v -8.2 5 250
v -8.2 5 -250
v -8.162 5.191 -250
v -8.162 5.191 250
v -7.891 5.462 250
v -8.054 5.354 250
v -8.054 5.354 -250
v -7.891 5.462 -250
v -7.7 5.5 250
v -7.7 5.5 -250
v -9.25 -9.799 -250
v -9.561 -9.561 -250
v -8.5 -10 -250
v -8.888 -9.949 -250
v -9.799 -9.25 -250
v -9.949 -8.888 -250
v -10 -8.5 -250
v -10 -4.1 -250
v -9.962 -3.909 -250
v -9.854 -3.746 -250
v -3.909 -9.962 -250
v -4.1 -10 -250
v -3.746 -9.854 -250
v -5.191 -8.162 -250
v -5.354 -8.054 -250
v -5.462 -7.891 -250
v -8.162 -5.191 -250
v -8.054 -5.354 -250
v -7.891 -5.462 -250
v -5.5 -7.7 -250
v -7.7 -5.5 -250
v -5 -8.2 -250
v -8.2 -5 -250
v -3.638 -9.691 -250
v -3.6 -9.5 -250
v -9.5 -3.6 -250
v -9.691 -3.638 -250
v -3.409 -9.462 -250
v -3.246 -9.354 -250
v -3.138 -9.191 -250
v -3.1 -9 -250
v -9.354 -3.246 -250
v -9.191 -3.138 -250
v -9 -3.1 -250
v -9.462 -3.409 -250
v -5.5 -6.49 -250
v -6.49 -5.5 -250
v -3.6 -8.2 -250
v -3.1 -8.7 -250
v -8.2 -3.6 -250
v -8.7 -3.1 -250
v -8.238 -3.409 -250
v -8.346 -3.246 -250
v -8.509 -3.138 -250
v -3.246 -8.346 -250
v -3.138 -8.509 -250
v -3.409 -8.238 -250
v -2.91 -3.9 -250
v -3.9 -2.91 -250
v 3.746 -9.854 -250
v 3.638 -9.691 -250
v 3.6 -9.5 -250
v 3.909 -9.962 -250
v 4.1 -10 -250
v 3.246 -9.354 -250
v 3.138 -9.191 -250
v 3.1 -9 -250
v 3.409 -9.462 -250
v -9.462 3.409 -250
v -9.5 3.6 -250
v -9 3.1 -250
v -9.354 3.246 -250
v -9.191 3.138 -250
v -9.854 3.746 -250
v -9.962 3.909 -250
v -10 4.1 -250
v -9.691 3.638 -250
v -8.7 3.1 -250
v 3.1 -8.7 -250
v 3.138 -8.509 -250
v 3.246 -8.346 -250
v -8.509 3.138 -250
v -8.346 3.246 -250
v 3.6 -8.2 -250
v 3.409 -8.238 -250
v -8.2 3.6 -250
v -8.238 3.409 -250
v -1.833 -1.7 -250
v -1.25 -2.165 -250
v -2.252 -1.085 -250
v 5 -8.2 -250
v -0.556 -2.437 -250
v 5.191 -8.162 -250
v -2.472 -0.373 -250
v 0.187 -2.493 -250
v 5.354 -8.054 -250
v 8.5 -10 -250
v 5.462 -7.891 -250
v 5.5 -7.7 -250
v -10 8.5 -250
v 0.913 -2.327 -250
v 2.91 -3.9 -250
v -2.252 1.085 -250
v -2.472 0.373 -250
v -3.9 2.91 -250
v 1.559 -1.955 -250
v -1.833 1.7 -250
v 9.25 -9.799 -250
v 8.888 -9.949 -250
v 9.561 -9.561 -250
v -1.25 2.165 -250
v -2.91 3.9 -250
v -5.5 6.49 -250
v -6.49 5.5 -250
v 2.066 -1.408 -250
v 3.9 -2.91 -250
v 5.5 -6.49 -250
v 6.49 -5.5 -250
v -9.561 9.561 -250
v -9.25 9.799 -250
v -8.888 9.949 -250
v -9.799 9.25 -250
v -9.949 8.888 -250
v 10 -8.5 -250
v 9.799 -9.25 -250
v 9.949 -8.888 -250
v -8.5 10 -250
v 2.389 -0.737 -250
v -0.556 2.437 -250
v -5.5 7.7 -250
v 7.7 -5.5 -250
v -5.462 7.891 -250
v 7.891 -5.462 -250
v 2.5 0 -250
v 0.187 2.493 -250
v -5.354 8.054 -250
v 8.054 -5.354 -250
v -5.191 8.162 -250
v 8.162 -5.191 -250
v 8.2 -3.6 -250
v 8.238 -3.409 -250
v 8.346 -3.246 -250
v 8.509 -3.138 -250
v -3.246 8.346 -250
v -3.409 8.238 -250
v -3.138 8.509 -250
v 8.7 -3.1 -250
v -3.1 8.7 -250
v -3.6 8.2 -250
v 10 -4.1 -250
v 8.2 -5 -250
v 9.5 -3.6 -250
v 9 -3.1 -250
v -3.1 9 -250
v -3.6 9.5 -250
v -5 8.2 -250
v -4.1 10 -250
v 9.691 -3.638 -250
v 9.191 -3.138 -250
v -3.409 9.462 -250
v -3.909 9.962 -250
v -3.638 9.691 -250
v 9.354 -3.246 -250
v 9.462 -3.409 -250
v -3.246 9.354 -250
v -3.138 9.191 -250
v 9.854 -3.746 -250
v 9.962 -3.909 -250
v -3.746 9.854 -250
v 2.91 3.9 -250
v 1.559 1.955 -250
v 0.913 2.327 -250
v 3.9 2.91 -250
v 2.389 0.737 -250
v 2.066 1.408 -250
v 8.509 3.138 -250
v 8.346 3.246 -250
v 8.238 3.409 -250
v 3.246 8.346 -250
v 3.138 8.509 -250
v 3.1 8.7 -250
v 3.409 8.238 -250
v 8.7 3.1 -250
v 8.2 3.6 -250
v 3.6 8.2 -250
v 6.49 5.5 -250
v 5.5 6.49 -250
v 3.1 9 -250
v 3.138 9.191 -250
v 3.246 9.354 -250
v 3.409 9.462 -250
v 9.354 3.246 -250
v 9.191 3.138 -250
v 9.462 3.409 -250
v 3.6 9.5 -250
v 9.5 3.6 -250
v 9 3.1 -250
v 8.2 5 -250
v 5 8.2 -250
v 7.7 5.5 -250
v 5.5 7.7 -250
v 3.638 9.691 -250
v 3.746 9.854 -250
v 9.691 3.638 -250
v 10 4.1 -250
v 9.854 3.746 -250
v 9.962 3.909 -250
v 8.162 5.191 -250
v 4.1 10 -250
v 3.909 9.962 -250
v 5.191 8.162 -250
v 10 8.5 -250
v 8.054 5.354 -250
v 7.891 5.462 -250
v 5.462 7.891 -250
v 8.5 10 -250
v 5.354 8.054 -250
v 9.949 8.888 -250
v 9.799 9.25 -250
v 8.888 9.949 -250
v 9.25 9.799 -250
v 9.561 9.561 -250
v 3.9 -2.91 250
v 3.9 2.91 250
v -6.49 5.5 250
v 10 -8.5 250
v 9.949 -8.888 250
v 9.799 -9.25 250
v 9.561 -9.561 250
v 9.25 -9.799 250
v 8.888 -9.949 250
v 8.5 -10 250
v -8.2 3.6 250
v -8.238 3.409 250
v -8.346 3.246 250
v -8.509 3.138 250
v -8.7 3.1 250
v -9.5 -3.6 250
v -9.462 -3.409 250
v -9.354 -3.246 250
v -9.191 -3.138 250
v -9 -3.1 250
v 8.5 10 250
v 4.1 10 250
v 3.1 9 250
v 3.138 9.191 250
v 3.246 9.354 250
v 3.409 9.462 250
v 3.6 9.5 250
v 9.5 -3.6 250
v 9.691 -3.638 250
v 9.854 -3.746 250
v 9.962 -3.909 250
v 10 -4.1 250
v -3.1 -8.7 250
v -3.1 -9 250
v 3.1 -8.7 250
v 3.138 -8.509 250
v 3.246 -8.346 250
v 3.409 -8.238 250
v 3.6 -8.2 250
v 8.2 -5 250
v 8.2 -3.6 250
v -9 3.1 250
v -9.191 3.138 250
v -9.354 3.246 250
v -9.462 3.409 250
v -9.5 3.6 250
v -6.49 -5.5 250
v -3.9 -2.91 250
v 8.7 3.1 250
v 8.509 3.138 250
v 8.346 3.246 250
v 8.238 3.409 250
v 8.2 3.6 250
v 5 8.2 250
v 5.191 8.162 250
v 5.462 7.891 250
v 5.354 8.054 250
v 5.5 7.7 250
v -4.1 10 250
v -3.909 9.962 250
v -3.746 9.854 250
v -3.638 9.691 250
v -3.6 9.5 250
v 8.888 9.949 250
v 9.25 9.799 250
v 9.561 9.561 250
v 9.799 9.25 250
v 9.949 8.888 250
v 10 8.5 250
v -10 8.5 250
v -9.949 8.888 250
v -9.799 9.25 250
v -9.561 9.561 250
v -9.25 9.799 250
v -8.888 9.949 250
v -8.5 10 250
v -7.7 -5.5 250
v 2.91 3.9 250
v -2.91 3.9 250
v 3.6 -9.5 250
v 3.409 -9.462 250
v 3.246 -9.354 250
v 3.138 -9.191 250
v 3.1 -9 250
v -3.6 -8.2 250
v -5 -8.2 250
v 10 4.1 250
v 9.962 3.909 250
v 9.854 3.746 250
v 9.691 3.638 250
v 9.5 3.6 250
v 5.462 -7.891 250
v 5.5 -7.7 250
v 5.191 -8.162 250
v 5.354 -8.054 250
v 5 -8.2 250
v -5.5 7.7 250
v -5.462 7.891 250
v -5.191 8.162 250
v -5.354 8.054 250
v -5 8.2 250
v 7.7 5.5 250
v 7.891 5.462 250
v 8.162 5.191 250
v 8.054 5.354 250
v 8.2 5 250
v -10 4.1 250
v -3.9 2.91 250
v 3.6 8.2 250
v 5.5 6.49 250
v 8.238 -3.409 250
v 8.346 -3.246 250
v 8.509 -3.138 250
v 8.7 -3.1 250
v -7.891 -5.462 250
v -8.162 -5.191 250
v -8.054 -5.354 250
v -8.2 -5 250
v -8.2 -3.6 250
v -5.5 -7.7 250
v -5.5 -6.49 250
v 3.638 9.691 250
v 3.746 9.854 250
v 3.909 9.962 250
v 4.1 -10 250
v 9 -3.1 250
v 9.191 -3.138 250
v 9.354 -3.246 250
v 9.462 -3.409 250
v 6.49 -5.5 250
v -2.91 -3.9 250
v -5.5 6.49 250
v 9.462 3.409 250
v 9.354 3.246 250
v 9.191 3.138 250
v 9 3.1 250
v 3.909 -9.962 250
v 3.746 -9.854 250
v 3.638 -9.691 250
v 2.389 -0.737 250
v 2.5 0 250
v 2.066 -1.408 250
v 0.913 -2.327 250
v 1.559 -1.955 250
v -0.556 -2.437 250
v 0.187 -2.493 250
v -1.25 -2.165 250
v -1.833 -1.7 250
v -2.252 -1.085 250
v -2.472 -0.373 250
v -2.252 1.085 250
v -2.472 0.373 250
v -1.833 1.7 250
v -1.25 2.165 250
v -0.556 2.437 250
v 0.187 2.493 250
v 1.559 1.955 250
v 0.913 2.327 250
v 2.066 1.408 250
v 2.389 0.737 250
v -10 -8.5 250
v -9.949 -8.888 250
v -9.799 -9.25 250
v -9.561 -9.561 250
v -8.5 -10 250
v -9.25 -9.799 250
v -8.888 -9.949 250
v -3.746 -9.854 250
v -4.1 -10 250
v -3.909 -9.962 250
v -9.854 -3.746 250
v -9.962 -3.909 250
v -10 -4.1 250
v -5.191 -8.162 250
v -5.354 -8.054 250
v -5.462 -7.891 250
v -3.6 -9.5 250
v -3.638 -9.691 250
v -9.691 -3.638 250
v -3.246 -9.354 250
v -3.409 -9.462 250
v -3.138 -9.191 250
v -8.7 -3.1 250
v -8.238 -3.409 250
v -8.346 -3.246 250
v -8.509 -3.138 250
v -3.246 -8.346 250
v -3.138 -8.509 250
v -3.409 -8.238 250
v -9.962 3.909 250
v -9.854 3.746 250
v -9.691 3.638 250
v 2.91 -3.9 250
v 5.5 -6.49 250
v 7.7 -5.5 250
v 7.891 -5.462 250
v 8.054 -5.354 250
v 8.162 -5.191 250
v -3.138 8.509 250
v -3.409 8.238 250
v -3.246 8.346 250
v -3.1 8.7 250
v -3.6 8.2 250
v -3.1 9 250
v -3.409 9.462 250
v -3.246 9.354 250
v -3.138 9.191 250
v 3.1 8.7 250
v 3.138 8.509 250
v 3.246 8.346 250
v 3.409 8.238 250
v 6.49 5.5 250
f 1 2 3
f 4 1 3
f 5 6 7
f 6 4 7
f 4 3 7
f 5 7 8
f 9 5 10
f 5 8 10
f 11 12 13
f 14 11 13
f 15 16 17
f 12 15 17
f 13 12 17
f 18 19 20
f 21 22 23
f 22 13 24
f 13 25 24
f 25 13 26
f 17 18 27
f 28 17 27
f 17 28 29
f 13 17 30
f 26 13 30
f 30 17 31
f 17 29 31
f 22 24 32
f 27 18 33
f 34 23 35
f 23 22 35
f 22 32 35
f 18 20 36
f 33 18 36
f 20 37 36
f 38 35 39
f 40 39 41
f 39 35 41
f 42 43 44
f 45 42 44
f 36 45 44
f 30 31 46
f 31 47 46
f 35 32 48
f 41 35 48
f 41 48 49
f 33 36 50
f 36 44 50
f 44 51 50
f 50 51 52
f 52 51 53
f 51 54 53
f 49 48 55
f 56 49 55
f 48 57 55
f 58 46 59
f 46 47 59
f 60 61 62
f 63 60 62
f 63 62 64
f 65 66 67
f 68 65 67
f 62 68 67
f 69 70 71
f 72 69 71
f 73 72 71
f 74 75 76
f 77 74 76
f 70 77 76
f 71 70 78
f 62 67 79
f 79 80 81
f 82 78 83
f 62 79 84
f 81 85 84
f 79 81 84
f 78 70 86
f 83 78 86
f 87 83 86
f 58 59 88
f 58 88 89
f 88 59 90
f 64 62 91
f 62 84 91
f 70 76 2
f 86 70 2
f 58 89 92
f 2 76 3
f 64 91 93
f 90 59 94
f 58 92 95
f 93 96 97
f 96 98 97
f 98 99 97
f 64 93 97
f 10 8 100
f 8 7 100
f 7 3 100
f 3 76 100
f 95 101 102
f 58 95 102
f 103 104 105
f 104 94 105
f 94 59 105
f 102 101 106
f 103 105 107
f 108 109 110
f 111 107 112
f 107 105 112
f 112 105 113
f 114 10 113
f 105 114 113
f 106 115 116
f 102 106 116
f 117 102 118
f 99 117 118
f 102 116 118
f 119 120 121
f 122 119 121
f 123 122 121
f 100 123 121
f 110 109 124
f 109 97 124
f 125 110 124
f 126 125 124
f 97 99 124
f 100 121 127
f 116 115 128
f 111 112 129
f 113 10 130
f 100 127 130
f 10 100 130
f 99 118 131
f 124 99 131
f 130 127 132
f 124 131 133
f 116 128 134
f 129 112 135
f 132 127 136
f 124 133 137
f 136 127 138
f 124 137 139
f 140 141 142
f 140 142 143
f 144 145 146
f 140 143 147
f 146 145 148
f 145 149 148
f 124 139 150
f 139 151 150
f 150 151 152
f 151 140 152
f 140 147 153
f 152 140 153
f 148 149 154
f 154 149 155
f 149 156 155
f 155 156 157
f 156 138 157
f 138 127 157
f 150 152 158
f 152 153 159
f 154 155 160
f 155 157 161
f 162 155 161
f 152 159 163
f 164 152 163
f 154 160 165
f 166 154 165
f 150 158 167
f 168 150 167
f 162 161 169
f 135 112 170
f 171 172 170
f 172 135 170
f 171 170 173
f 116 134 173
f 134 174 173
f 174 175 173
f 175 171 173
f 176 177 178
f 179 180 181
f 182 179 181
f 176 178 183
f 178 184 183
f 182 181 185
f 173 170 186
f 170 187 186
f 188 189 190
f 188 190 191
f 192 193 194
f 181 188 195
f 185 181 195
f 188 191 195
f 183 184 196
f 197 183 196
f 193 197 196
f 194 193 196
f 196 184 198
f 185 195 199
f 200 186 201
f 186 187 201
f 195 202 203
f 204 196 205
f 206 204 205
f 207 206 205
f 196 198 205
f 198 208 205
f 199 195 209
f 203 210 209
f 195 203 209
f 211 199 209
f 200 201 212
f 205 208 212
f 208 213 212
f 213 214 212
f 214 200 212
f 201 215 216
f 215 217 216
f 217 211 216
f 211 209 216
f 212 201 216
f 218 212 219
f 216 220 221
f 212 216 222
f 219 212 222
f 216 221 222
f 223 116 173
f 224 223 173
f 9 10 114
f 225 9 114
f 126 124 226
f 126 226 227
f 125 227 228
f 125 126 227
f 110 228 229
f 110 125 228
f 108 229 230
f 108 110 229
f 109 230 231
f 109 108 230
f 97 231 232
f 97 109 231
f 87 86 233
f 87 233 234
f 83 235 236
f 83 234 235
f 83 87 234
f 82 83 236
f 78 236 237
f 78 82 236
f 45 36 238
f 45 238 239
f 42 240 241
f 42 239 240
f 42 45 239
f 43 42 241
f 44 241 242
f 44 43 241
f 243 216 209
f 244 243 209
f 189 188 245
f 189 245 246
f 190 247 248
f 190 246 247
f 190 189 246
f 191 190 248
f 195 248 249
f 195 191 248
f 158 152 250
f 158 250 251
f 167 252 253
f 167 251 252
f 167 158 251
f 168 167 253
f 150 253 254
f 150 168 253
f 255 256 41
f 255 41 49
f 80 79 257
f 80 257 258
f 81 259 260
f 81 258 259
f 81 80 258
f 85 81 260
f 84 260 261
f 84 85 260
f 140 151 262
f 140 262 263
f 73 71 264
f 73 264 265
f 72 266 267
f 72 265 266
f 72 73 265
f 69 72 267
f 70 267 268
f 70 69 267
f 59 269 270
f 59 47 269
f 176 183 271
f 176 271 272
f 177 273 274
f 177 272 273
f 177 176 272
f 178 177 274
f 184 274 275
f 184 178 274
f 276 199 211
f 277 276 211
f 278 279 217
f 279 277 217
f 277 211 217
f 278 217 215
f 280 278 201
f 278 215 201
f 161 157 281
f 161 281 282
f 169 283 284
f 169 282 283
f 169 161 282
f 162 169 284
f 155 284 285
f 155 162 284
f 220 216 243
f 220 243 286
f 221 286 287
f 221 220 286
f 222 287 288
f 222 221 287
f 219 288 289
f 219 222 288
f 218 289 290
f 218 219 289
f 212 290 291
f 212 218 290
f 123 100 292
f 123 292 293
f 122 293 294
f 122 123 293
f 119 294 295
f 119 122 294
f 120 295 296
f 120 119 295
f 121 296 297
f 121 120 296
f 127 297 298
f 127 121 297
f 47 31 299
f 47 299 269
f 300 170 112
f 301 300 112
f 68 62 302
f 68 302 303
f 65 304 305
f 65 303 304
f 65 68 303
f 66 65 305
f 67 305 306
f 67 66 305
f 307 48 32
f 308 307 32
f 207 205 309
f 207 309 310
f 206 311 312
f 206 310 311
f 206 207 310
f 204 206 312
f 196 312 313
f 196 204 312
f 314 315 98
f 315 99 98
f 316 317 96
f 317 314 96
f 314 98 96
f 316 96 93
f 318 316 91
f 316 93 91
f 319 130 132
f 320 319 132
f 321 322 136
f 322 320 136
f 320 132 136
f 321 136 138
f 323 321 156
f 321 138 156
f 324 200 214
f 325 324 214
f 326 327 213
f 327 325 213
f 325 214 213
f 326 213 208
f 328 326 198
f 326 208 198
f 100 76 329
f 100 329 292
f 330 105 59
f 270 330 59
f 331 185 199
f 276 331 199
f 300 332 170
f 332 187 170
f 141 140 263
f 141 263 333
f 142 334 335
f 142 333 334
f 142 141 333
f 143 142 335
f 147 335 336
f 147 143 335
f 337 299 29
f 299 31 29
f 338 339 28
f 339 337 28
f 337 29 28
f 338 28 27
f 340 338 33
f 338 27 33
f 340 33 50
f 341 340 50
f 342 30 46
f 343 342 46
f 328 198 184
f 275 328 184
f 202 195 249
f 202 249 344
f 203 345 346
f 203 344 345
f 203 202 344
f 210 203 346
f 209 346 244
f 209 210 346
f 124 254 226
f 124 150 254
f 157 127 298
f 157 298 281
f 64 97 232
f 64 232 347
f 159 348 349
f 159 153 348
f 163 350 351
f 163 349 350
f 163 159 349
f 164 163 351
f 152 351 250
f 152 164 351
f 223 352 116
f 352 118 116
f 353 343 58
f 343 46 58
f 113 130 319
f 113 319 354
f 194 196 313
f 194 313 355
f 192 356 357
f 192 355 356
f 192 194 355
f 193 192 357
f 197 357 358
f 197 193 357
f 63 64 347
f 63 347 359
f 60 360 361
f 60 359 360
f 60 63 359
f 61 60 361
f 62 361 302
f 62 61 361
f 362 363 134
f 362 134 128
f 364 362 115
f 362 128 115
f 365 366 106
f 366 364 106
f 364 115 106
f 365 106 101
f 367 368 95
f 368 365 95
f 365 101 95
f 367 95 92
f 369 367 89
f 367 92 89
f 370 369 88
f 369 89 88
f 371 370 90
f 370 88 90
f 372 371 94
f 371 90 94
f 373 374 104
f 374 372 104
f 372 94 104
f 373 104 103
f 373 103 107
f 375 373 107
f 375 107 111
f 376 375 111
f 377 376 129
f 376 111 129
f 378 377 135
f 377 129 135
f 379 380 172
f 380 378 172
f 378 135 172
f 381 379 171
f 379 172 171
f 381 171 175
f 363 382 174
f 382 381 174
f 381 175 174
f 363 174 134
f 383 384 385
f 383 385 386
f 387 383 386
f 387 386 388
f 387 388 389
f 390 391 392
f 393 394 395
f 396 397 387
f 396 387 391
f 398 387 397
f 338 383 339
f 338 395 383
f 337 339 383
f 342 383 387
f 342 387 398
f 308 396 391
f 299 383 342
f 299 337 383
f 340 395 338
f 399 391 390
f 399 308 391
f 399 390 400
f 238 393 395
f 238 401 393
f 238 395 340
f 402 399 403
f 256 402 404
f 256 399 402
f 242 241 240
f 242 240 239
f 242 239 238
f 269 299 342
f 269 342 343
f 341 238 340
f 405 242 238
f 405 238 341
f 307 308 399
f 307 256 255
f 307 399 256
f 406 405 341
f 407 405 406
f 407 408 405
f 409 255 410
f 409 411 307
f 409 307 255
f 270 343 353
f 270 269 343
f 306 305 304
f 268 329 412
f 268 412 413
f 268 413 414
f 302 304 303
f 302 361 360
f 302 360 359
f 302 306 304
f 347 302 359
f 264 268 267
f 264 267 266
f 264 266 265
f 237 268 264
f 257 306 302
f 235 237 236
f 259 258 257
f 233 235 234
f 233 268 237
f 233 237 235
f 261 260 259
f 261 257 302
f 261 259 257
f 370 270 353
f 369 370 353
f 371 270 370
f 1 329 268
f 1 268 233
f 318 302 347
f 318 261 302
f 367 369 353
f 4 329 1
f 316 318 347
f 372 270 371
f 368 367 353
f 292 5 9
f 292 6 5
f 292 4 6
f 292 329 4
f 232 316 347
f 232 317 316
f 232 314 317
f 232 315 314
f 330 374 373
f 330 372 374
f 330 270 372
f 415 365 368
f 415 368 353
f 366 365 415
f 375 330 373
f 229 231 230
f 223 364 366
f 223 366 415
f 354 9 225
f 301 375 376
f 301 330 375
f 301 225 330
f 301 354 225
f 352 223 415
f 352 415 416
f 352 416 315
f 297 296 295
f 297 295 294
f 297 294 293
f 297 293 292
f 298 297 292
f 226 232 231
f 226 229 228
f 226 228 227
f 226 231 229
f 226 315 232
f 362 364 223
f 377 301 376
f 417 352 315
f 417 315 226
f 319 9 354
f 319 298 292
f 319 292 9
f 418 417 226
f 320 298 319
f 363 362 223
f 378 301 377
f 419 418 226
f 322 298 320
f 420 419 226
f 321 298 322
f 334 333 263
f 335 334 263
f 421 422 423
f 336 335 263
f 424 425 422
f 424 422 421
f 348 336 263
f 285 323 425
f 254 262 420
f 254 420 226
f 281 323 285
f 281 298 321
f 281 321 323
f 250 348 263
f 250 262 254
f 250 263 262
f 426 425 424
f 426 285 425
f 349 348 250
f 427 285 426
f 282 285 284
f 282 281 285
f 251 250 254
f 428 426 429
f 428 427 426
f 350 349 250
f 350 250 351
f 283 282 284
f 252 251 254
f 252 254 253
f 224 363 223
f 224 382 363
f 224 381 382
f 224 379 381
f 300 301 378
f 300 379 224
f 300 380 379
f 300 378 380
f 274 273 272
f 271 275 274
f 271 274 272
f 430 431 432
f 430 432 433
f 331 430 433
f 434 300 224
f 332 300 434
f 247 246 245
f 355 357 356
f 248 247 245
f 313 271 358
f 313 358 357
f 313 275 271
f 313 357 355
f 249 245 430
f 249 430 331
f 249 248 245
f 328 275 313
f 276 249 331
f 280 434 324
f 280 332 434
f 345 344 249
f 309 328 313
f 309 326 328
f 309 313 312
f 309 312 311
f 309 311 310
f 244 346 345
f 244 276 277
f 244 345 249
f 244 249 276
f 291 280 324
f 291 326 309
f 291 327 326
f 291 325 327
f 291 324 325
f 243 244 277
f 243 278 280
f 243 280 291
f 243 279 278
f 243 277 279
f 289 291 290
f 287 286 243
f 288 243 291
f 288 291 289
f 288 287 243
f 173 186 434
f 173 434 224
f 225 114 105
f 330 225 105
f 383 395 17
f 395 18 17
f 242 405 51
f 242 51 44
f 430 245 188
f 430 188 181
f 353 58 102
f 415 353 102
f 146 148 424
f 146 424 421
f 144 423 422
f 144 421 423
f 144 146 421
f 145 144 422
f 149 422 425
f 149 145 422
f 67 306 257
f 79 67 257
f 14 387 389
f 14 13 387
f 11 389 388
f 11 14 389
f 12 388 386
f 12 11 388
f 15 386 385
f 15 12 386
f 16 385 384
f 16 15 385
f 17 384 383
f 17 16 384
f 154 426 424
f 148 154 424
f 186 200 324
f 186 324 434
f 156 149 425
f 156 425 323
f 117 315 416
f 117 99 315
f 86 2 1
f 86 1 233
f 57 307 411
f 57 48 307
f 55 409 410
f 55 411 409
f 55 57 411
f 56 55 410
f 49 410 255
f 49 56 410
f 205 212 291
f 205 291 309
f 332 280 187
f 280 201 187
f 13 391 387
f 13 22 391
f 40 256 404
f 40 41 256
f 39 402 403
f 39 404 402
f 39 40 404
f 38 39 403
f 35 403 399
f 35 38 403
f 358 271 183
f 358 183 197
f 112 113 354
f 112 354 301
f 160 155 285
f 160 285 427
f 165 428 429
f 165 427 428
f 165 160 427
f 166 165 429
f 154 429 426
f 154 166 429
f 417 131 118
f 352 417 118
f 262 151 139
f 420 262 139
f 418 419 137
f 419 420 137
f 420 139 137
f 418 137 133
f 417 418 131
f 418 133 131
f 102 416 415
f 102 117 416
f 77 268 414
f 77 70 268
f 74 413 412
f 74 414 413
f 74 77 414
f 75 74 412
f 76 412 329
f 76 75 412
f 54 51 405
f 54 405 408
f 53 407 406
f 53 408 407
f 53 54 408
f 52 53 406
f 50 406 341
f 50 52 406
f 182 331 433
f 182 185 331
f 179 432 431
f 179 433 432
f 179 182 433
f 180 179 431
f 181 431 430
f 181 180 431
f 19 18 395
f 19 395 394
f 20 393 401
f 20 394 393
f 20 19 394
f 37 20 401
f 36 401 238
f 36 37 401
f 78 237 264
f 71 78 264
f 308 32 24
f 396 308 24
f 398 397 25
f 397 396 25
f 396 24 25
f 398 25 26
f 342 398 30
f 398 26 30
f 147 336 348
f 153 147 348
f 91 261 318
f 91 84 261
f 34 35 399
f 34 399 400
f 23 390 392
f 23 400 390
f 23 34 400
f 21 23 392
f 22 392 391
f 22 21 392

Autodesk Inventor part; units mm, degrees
ref_plane "YZ Plane" through (0, 0, 0) normal (1, 0, 0) x (0, 1, 0)
ref_plane "XZ Plane" through (0, 0, 0) normal (0, 1, 0) x (-1, 0, 0)
ref_plane "XY Plane" through (0, 0, 0) normal (0, 0, 1) x (1, 0, 0)
sketch "Sketch1" plane through (0, 0, 0) normal (0, 0, 1) x (1, 0, 0)
  line L0 (-8.5, 10) -> (-4.1, 10)
  line L1 (10, 10) -> (10, -10)
  line L2 (10, -10) -> (-10, -10)
  line L3 (-10, 4.1) -> (-10, 8.5)
  line L4 (-10, 10) -> (10, -10) construction
  line L5 (10, 10) -> (-10, -10) construction
  line L6 (2.9101, 3.9) -> (-2.9101, 3.9)
  line L7 (-3.9, 2.9101) -> (-3.9, -2.9101)
  line L8 (3.9, -2.9101) -> (3.9, 2.9101)
  line L9 (-3.1, 9) -> (-3.1, 8.7)
  line L10 (-3.6, 8.2) -> (-5, 8.2)
  line L11 (-5.5, 7.7) -> (-5.5, 6.4899)
  line L12 (-8.2, 5) -> (-8.2, 3.6)
  line L13 (-8.7, 3.1) -> (-9, 3.1)
  line L14 (-7.7, 5.5) -> (-6.4899, 5.5)
  arc A0 (-8.5, 10) -> (-10, 8.5) centre (-8.5, 8.5) ccw
  line L15 (-3.6, 9.5) -> (-3.6, 9.5)
  line L16 (-3.6, 9.5) -> (-3.6, 9.5)
  line L17 (-9.5, 3.6) -> (-9.5, 3.6)
  line L18 (-9.5, 3.6) -> (-9.5, 3.6)
  arc A1 (-5, 8.2) -> (-5.5, 7.7) centre (-5, 7.7) ccw
  arc A2 (-7.7, 5.5) -> (-8.2, 5) centre (-7.7, 5) ccw
  arc A3 (-8.7, 3.1) -> (-8.2, 3.6) centre (-8.7, 3.6) ccw
  arc A4 (-3.6, 8.2) -> (-3.1, 8.7) centre (-3.6, 8.7) ccw
  arc A5 (-3.1, 9) -> (-3.6, 9.5) centre (-3.6, 9) ccw
  arc A6 (-3.6, 9.5) -> (-4.1, 10) centre (-4.1, 9.5) ccw
  arc A7 (-9.5, 3.6) -> (-9, 3.1) centre (-9, 3.6) ccw
  arc A8 (-10, 4.1) -> (-9.5, 3.6) centre (-9.5, 4.1) ccw
  line L19 (-6.4899, 5.5) -> (-3.9, 2.9101)
  line L20 (-5.5, 6.4899) -> (-2.9101, 3.9)
  line L21 (-14.4349, 0) -> (14.4349, 0) construction
  line L22 (0, -14.4349) -> (0, 14.4349) construction
  line L23 (8.5, 10) -> (4.1, 10)
  line L24 (10, 4.1) -> (10, 8.5)
  line L25 (3.1, 9) -> (3.1, 8.7)
  line L26 (3.6, 8.2) -> (5, 8.2)
  line L27 (5.5, 7.7) -> (5.5, 6.4899)
  line L28 (8.2, 5) -> (8.2, 3.6)
  line L29 (8.7, 3.1) -> (9, 3.1)
  line L30 (7.7, 5.5) -> (6.4899, 5.5)
  arc A9 (10, 8.5) -> (8.5, 10) centre (8.5, 8.5) ccw
  line L31 (3.6, 9.5) -> (3.6, 9.5)
  line L32 (3.6, 9.5) -> (3.6, 9.5)
  line L33 (9.5, 3.6) -> (9.5, 3.6)
  line L34 (9.5, 3.6) -> (9.5, 3.6)
  arc A10 (5.5, 7.7) -> (5, 8.2) centre (5, 7.7) ccw
  arc A11 (8.2, 5) -> (7.7, 5.5) centre (7.7, 5) ccw
  arc A12 (8.2, 3.6) -> (8.7, 3.1) centre (8.7, 3.6) ccw
  arc A13 (3.1, 8.7) -> (3.6, 8.2) centre (3.6, 8.7) ccw
  arc A14 (3.6, 9.5) -> (3.1, 9) centre (3.6, 9) ccw
  arc A15 (4.1, 10) -> (3.6, 9.5) centre (4.1, 9.5) ccw
  arc A16 (9, 3.1) -> (9.5, 3.6) centre (9, 3.6) ccw
  arc A17 (9.5, 3.6) -> (10, 4.1) centre (9.5, 4.1) ccw
  line L35 (6.4899, 5.5) -> (3.9, 2.9101)
  line L36 (5.5, 6.4899) -> (2.9101, 3.9)
  line L37 (-8.5, -10) -> (-4.1, -10)
  line L38 (-10, -4.1) -> (-10, -8.5)
  line L39 (-3.1, -9) -> (-3.1, -8.7)
  line L40 (-3.6, -8.2) -> (-5, -8.2)
  line L41 (-5.5, -7.7) -> (-5.5, -6.4899)
  line L42 (-8.2, -5) -> (-8.2, -3.6)
  line L43 (-8.7, -3.1) -> (-9, -3.1)
  line L44 (-7.7, -5.5) -> (-6.4899, -5.5)
  arc A18 (-10, -8.5) -> (-8.5, -10) centre (-8.5, -8.5) ccw
  arc A19 (-5.5, -7.7) -> (-5, -8.2) centre (-5, -7.7) ccw
  arc A20 (-8.2, -5) -> (-7.7, -5.5) centre (-7.7, -5) ccw
  arc A21 (-8.2, -3.6) -> (-8.7, -3.1) centre (-8.7, -3.6) ccw
  arc A22 (-3.1, -8.7) -> (-3.6, -8.2) centre (-3.6, -8.7) ccw
  arc A23 (-3.6, -9.5) -> (-3.1, -9) centre (-3.6, -9) ccw
  arc A24 (-4.1, -10) -> (-3.6, -9.5) centre (-4.1, -9.5) ccw
  arc A25 (-9, -3.1) -> (-9.5, -3.6) centre (-9, -3.6) ccw
  arc A26 (-9.5, -3.6) -> (-10, -4.1) centre (-9.5, -4.1) ccw
  line L45 (-6.4899, -5.5) -> (-3.9, -2.9101)
  line L46 (-5.5, -6.4899) -> (-2.9101, -3.9)
  arc A27 (10, -4.1) -> (9.5, -3.6) centre (9.5, -4.1) ccw
  line L47 (6.4899, -5.5) -> (3.9, -2.9101)
  arc A28 (7.7, -5.5) -> (8.2, -5) centre (7.7, -5) ccw
  line L48 (5.5, -7.7) -> (5.5, -6.4899)
  line L49 (10, -4.1) -> (10, -8.5)
  line L50 (3.1, -9) -> (3.1, -8.7)
  line L51 (8.5, -10) -> (4.1, -10)
  line L52 (3.6, -8.2) -> (5, -8.2)
  arc A29 (5, -8.2) -> (5.5, -7.7) centre (5, -7.7) ccw
  line L53 (7.7, -5.5) -> (6.4899, -5.5)
  arc A30 (8.7, -3.1) -> (8.2, -3.6) centre (8.7, -3.6) ccw
  arc A31 (8.5, -10) -> (10, -8.5) centre (8.5, -8.5) ccw
  line L54 (8.2, -5) -> (8.2, -3.6)
  line L55 (8.7, -3.1) -> (9, -3.1)
  arc A32 (9.5, -3.6) -> (9, -3.1) centre (9, -3.6) ccw
  arc A33 (3.6, -8.2) -> (3.1, -8.7) centre (3.6, -8.7) ccw
  arc A34 (3.1, -9) -> (3.6, -9.5) centre (3.6, -9) ccw
  arc A35 (3.6, -9.5) -> (4.1, -10) centre (4.1, -9.5) ccw
  line L56 (5.5, -6.4899) -> (2.9101, -3.9)
  line L57 (-2.9101, -3.9) -> (2.9101, -3.9)
  circle A36 centre (0, 0) radius 2.5
  point P0 (-9.5, 3.1)
  point P1 (-3.6, 9.5)
  point P2 (-3.6, 9.5)
  point P3 (-10, 3.6)
  point P4 (9.5, 3.1)
  point P5 (3.6, 9.5)
  point P6 (3.6, 9.5)
  point P7 (10, 3.6)
  point P8 (-9.5, -3.1)
  point P9 (-3.6, -9.5)
  point P10 (-3.6, -9.5)
  point P11 (-3.6, -9.5)
  point P12 (-9.5, -3.6)
  point P13 (-10, -3.6)
  point P14 (10, -3.6)
  point P15 (3.6, -9.5)
  point P16 (3.6, -9.5)
  point P17 (9.5, -3.1)
  point P18 (3.6, -9.5)
  point P19 (9.5, -3.6)
  dimension "d0" = 20
  dimension "d1" = 20
  dimension "d2" = 6.1
  dimension "d3" = 1.8
  dimension "d4" = 1.8
  dimension "d5" = 6.9
  dimension "d6" = 6.9
  dimension "d7" = 4.5
  dimension "d8" = 1.5
  dimension "d9" = 0.5
  dimension "d10" = 0.5
  dimension "d11" = 0.5
  dimension "d12" = 0.5
  dimension "d13" = 0.5
  dimension "d14" = 0.5
  dimension "d15" = 0.5
  dimension "d16" = 1.4
  dimension "d17" = 0.7
  dimension "d20" = 4.5
  dimension "d22" = 6.1
  dimension "d23" = 5
extrude "Extrusion1" add sketch "Sketch1" along normal mid plane 500 contours L0 A6 A5 L9 A4 L10 A1 L11 L20 L6 L36 L27 A10 L26 A13 L25 A14 A15 L23 A9 L1 A17 A16 L29 A12 L28 A11 L30 L35 L8 L47 L53 A28 L54 A30 L55 A32 A27 A31 L2 A35 A34 L50 A33 L52 A29 L48 L56 L57 L46 L41 A19 L40 A22 L39 A23 A24 A18 L38 A26 A25 L43 A21 L42 A20 L44 L45 L7 L19 L14 A2 L12 A3 L13 A7 A8 L3 A0
equation "\"d4\" = d3"
equation "\"d6\" = d5"
equation "\"d10\" = d9"
equation "\"d12\" = d11"
properties part number "HCMUTE-CDT23-OP_NDH-2020X500"
